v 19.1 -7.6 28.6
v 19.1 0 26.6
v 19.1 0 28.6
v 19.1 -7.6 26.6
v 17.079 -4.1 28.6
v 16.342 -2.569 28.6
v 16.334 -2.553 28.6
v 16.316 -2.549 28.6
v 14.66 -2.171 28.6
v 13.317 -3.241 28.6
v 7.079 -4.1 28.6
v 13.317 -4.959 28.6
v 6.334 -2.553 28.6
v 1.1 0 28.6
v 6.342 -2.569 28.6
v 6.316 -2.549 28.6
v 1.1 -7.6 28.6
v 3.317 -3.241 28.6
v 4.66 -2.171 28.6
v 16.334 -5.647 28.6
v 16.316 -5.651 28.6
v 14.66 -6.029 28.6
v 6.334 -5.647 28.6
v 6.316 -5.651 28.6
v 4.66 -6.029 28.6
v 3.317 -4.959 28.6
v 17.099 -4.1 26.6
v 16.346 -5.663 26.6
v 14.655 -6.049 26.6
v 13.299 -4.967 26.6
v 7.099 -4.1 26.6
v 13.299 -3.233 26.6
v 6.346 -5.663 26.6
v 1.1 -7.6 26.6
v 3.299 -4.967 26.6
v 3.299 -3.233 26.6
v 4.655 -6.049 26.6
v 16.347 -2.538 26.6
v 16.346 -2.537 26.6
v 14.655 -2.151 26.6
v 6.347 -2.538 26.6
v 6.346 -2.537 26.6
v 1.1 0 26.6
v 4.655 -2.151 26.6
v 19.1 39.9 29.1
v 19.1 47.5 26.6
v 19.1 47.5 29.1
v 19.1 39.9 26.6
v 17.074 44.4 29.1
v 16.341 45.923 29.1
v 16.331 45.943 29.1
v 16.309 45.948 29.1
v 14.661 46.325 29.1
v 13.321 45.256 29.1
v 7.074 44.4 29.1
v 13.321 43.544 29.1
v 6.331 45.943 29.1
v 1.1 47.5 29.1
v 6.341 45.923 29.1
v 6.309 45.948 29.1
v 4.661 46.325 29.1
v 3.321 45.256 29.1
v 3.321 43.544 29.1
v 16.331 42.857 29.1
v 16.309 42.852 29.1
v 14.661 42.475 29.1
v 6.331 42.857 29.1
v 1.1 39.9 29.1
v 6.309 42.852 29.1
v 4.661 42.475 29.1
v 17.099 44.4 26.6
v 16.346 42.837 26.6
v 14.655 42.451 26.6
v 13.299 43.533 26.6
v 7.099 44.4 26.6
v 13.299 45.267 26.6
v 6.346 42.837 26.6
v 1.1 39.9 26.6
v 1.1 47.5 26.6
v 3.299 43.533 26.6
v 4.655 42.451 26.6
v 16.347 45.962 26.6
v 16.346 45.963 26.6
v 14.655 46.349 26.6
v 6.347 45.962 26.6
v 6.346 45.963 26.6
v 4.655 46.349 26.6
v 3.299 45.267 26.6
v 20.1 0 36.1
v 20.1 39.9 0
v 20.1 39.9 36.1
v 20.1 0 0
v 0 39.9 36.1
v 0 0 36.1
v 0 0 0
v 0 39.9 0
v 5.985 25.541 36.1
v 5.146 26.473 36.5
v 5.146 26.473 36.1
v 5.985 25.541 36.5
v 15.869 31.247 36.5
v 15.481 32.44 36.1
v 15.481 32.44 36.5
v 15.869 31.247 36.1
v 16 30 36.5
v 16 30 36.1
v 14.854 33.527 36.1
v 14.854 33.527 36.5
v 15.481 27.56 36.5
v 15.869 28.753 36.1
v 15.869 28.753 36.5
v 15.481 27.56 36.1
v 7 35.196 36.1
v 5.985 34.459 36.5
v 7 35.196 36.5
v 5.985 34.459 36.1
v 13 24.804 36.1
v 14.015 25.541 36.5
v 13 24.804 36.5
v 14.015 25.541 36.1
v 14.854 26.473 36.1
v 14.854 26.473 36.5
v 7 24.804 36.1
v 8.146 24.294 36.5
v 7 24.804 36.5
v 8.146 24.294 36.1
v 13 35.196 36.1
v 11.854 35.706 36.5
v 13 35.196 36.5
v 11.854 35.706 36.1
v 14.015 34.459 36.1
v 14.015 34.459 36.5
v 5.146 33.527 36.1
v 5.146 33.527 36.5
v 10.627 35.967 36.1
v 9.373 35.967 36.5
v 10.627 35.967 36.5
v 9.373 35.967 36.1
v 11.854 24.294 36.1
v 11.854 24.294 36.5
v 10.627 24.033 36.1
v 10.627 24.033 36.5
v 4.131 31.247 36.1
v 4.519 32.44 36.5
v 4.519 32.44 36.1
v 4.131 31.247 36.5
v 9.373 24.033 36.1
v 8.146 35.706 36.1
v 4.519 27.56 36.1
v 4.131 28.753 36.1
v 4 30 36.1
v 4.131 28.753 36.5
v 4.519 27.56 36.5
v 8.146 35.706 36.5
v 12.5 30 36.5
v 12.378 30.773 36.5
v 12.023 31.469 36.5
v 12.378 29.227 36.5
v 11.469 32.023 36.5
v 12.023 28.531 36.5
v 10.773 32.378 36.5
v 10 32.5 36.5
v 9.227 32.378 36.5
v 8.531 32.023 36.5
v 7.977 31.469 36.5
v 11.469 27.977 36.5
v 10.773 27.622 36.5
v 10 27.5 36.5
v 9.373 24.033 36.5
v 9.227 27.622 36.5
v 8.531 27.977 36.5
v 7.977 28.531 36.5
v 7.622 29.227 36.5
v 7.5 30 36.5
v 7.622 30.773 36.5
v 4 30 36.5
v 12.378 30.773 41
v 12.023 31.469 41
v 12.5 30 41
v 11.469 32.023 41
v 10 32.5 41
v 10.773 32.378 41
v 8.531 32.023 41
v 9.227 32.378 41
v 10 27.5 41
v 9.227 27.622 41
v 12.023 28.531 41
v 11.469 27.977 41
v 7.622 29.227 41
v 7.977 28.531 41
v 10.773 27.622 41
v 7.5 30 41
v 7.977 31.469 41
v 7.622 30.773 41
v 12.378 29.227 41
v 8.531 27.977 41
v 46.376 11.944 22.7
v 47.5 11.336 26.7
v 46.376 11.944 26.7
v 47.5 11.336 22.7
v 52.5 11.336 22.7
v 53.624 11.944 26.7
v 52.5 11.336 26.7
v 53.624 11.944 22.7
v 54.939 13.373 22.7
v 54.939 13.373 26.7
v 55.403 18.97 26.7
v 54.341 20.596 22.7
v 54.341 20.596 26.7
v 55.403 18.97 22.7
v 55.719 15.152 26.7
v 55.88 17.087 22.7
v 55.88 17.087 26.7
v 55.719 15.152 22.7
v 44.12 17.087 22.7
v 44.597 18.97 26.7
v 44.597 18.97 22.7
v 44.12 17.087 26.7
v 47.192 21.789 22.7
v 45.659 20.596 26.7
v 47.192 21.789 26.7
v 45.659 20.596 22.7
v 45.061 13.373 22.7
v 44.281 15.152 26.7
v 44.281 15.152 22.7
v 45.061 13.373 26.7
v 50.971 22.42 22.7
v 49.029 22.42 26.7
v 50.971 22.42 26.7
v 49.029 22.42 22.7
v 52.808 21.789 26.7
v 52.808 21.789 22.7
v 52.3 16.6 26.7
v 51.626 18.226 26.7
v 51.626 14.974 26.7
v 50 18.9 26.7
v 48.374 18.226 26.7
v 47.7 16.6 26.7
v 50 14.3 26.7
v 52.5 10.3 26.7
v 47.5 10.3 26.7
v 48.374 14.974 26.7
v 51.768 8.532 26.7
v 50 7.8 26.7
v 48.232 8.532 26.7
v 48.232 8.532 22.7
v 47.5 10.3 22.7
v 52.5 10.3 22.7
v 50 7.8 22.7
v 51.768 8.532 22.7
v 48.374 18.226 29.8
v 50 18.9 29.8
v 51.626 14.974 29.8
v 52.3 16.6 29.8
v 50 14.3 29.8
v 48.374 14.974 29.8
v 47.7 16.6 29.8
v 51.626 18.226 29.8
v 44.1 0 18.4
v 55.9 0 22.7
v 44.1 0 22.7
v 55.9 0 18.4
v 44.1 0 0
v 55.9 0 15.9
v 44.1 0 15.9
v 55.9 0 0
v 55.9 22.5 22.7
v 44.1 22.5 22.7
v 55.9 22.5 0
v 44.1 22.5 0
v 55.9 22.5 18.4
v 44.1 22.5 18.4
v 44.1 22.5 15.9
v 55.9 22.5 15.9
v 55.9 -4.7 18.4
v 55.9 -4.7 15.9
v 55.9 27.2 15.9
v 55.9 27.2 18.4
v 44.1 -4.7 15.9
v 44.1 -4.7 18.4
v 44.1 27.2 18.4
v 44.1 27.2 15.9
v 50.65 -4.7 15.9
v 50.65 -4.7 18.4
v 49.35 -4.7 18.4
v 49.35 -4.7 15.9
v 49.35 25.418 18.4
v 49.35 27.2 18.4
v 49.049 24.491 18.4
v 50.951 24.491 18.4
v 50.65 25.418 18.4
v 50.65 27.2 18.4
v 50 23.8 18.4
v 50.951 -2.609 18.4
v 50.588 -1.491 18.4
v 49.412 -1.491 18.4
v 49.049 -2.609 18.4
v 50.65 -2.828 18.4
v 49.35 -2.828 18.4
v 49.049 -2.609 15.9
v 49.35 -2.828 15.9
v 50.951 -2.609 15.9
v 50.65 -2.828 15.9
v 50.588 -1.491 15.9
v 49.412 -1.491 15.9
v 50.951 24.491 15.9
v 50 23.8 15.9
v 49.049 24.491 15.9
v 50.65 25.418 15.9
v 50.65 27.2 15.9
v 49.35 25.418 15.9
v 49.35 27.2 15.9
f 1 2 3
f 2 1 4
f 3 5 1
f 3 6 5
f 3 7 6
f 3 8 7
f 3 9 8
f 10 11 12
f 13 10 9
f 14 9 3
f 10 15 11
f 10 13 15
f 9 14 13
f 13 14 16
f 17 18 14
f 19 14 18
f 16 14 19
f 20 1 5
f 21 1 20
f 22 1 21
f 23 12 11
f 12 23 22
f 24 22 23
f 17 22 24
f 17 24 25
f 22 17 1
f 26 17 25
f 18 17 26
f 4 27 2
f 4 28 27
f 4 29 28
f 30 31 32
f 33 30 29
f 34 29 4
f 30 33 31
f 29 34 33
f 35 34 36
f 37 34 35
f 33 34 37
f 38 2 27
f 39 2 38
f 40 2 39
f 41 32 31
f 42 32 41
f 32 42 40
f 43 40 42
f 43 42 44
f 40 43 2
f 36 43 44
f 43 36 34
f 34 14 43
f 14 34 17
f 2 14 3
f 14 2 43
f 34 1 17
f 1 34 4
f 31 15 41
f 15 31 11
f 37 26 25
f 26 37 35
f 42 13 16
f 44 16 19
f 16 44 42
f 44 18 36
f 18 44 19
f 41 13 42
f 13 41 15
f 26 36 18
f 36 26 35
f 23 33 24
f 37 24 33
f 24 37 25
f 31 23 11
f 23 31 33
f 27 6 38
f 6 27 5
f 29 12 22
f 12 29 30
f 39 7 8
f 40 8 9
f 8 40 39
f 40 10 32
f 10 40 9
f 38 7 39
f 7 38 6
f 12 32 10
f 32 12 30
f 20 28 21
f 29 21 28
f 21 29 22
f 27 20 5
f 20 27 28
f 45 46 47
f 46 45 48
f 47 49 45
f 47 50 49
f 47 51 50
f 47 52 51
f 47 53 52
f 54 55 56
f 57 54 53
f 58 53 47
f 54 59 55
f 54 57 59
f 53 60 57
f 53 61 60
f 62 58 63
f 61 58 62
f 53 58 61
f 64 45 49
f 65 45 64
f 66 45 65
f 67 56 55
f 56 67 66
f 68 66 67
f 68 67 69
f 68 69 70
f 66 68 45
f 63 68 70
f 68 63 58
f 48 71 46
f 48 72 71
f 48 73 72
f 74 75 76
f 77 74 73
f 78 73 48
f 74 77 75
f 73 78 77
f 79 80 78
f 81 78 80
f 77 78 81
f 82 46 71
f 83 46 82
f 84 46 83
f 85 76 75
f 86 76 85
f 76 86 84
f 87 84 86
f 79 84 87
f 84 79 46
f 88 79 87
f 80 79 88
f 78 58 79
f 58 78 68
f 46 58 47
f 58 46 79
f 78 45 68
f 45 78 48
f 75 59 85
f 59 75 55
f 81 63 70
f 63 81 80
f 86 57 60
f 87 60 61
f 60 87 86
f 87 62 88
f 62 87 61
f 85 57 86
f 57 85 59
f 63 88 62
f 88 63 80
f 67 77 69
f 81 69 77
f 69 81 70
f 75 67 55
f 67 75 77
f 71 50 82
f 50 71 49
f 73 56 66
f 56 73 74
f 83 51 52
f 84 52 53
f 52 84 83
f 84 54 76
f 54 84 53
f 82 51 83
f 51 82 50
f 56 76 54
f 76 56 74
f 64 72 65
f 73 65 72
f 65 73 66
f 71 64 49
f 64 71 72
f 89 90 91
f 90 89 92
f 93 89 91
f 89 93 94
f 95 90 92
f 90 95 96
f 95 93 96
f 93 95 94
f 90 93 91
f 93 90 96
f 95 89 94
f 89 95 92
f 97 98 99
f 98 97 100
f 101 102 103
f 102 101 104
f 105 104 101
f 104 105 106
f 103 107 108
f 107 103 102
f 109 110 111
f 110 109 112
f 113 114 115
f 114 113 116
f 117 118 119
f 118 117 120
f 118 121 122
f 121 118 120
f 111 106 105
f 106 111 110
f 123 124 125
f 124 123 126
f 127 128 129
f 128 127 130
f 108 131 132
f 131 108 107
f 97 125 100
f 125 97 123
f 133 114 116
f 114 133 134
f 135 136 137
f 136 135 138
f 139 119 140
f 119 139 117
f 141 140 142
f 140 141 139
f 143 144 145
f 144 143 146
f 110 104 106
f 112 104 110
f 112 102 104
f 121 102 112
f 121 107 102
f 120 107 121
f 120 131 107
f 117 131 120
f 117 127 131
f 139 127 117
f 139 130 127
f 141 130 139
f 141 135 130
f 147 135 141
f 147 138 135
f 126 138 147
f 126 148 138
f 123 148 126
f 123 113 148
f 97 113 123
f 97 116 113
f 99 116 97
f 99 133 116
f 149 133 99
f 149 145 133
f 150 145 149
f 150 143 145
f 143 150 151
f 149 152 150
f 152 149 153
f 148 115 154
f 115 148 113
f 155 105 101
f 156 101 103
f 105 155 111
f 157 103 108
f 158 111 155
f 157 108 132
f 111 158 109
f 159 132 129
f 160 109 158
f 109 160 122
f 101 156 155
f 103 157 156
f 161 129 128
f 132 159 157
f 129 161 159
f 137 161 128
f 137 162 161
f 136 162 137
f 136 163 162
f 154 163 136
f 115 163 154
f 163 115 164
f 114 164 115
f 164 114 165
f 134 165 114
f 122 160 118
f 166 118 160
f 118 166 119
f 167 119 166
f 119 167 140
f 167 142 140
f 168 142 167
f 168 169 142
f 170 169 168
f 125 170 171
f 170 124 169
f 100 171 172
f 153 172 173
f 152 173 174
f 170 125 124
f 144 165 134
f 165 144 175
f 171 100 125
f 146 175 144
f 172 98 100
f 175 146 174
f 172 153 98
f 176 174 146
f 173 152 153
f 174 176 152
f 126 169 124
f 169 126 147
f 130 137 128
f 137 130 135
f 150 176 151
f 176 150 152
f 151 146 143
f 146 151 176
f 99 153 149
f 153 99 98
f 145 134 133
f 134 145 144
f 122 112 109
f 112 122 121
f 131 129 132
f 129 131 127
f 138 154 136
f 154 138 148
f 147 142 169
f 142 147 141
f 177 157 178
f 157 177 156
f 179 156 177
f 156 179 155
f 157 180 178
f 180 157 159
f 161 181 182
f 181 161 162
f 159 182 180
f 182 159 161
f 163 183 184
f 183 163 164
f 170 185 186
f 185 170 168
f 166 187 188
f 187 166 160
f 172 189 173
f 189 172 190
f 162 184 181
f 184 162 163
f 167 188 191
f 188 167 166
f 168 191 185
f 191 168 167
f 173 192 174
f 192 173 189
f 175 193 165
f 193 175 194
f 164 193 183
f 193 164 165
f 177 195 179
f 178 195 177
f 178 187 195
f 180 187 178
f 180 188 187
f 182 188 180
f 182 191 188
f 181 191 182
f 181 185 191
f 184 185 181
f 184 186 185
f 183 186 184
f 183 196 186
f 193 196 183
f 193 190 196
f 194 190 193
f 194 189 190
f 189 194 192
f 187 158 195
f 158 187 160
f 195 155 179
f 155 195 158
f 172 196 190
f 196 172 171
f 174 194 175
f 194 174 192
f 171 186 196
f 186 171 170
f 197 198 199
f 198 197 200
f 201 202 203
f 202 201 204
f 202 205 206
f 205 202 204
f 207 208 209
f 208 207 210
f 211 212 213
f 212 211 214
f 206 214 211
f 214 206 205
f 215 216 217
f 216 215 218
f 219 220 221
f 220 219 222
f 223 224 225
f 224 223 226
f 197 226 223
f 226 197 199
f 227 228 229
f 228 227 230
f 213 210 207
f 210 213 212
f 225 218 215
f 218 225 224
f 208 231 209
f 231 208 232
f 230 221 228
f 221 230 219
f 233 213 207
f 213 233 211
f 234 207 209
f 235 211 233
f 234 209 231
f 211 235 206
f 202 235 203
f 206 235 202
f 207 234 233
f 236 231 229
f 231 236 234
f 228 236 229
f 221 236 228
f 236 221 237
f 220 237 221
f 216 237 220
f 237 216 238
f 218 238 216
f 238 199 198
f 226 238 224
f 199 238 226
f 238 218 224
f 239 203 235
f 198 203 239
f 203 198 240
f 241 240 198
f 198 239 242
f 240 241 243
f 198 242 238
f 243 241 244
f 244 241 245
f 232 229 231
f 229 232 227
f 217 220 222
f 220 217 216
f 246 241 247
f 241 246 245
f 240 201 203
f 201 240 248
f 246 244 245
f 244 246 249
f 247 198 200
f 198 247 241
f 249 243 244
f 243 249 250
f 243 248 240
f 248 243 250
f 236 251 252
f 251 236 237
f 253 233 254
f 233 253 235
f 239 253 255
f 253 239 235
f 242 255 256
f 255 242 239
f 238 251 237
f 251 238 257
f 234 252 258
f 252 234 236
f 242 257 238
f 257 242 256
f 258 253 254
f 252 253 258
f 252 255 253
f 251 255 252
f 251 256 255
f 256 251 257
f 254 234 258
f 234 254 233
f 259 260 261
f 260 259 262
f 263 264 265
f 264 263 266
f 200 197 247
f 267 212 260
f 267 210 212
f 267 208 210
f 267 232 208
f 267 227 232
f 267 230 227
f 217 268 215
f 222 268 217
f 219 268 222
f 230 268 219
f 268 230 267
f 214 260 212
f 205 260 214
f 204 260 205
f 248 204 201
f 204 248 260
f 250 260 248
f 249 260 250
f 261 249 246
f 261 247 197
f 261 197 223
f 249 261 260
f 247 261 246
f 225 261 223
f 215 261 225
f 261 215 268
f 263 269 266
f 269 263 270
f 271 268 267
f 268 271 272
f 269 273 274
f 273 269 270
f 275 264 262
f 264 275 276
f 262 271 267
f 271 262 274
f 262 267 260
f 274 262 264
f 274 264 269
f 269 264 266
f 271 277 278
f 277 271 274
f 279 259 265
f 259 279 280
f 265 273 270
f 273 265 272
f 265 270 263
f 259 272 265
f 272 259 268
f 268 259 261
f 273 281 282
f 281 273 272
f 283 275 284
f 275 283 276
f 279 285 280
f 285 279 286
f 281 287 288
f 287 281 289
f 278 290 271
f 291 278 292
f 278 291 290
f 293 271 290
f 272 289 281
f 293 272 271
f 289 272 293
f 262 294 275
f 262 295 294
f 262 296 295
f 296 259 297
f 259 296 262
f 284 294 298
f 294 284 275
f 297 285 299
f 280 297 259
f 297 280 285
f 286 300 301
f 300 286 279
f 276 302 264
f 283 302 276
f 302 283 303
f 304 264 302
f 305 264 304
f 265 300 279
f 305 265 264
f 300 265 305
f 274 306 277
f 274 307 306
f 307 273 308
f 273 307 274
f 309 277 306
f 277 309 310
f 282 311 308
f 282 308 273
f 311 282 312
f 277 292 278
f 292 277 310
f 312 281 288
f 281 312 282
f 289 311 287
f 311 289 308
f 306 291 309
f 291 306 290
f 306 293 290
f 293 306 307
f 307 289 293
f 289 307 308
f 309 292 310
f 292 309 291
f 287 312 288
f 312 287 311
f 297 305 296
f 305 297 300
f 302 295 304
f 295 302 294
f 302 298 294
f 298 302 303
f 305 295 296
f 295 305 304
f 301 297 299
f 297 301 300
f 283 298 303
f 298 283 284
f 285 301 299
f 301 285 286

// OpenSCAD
/**
 * Servo outline library
 *
 * Authors:
 *   - Eero 'rambo' af Heurlin 2010-
 *
 * License: LGPL 2.1
 */

use <MCAD/triangles.scad>

/**
 * TowerPro SG90 servo
 *
 * @param vector position The position vector
 * @param vector rotation The rotation vector
 * @param boolean screws If defined then "screws" will be added and when the module is differenced() from something if will have holes for the screws
 * @param boolean cables If defined then "cables" output will be added and when the module is differenced() from something if will have holes for the cables output
 * @param number axle_length If defined this will draw a red indicator for the main axle
 */
module towerprosg90(position=undef, rotation=undef, screws = 0, axle_length = 0, cables=0)
{
	translate(position) rotate(rotation) {
        difference(){
            union()
            {
                translate([-5.9,-11.8/2,0]) cube([22.5,11.8,22.7]);
                translate([0,0,22.7-0.1]){
                    cylinder(d=11.8,h=4+0.1);
                    hull(){
                        translate([8.8-5/2,0,0]) cylinder(d=5,h=4+0.1);
                        cylinder(d=5,h=4+0.1);
                    }
                    translate([0,0,4]) cylinder(d=4.6,h=3.2);
                }
                translate([-4.7-5.9,-11.8/2,15.9]) cube([22.5+4.7*2, 11.8, 2.5]); 
            }
            //screw holes
            translate([-2.3-5.9,0,15.9+1.25]) cylinder(d=2,h=5, center=true);
            translate([-2.3-5.9-2,0,15.9+1.25]) cube([3,1.3,5], center=true);
            translate([2.3+22.5-5.9,0,15.9+1.25]) cylinder(d=2,h=5, center=true);
            translate([2.3+22.5-5.9+2,0,15.9+1.25]) cube([3,1.3,5], center=true);
        }
        if (axle_length > 0) {
            color("red", 0.3) translate([0,0,29.9/2]) cylinder(r=1, h=29.9+axle_length, center=true);
        }
        if (cables > 0) color("red", 0.3) translate([-12.4,-1.8,4.5]) cube([10,3.6,1.2]);
        if(screws > 0) color("red", 0.3) {
            translate([-2.3-5.9,0,15.9+1.25]) cylinder(d=2,h=10, center=true);
            translate([2.3+22.5-5.9,0,15.9+1.25]) cylinder(d=2,h=10, center=true);
        }
    }
    
}

/**
 * Futaba S3003 servo
 *
 * @param vector position The position vector
 * @param vector rotation The rotation vector
 */
module futabas3003(position, rotation)
{
	translate(position)
	{
		rotate(rotation)
	    {
			union()
			{
				// Box and ears
				translate([0,0,0])
				{
					cube([20.1, 39.9, 36.1], false);
					translate([1.1, -7.6, 26.6])
					{
                        difference() {
						    cube([18, 7.6, 2]);
                            translate([4, 3.5, -0.1])
                                cylinder(100, 2);
                            translate([14, 3.5, -0.1])
                                cylinder(100, 2);
                        }
					}

					translate([1.1, 39.9, 26.6])
					{
                        difference() {
                            cube([18, 7.6, 2.5]);
                            translate([4, 4.5, -0.1])
                                cylinder(100, 2);
                            translate([14, 4.5, -0.1])
                                cylinder(100, 2);
                        }
                    }
				}

				// Main axle
				translate([10, 30, 36.1])
				{
					cylinder(r=6, h=0.4, $fn=30);
					cylinder(r=2.5, h=4.9, $fn=20);
				}
			}
		}
	}
}


translate([0, 0, 0]) 
futabas3003(position=[0, 0, 0], rotation=[0, 0, 0]);

translate([50, 16.6, 0]) 
rotate([0, 0, 270])
towerprosg90(position=[0, 0, 0], rotation=[0, 0, 0]);
